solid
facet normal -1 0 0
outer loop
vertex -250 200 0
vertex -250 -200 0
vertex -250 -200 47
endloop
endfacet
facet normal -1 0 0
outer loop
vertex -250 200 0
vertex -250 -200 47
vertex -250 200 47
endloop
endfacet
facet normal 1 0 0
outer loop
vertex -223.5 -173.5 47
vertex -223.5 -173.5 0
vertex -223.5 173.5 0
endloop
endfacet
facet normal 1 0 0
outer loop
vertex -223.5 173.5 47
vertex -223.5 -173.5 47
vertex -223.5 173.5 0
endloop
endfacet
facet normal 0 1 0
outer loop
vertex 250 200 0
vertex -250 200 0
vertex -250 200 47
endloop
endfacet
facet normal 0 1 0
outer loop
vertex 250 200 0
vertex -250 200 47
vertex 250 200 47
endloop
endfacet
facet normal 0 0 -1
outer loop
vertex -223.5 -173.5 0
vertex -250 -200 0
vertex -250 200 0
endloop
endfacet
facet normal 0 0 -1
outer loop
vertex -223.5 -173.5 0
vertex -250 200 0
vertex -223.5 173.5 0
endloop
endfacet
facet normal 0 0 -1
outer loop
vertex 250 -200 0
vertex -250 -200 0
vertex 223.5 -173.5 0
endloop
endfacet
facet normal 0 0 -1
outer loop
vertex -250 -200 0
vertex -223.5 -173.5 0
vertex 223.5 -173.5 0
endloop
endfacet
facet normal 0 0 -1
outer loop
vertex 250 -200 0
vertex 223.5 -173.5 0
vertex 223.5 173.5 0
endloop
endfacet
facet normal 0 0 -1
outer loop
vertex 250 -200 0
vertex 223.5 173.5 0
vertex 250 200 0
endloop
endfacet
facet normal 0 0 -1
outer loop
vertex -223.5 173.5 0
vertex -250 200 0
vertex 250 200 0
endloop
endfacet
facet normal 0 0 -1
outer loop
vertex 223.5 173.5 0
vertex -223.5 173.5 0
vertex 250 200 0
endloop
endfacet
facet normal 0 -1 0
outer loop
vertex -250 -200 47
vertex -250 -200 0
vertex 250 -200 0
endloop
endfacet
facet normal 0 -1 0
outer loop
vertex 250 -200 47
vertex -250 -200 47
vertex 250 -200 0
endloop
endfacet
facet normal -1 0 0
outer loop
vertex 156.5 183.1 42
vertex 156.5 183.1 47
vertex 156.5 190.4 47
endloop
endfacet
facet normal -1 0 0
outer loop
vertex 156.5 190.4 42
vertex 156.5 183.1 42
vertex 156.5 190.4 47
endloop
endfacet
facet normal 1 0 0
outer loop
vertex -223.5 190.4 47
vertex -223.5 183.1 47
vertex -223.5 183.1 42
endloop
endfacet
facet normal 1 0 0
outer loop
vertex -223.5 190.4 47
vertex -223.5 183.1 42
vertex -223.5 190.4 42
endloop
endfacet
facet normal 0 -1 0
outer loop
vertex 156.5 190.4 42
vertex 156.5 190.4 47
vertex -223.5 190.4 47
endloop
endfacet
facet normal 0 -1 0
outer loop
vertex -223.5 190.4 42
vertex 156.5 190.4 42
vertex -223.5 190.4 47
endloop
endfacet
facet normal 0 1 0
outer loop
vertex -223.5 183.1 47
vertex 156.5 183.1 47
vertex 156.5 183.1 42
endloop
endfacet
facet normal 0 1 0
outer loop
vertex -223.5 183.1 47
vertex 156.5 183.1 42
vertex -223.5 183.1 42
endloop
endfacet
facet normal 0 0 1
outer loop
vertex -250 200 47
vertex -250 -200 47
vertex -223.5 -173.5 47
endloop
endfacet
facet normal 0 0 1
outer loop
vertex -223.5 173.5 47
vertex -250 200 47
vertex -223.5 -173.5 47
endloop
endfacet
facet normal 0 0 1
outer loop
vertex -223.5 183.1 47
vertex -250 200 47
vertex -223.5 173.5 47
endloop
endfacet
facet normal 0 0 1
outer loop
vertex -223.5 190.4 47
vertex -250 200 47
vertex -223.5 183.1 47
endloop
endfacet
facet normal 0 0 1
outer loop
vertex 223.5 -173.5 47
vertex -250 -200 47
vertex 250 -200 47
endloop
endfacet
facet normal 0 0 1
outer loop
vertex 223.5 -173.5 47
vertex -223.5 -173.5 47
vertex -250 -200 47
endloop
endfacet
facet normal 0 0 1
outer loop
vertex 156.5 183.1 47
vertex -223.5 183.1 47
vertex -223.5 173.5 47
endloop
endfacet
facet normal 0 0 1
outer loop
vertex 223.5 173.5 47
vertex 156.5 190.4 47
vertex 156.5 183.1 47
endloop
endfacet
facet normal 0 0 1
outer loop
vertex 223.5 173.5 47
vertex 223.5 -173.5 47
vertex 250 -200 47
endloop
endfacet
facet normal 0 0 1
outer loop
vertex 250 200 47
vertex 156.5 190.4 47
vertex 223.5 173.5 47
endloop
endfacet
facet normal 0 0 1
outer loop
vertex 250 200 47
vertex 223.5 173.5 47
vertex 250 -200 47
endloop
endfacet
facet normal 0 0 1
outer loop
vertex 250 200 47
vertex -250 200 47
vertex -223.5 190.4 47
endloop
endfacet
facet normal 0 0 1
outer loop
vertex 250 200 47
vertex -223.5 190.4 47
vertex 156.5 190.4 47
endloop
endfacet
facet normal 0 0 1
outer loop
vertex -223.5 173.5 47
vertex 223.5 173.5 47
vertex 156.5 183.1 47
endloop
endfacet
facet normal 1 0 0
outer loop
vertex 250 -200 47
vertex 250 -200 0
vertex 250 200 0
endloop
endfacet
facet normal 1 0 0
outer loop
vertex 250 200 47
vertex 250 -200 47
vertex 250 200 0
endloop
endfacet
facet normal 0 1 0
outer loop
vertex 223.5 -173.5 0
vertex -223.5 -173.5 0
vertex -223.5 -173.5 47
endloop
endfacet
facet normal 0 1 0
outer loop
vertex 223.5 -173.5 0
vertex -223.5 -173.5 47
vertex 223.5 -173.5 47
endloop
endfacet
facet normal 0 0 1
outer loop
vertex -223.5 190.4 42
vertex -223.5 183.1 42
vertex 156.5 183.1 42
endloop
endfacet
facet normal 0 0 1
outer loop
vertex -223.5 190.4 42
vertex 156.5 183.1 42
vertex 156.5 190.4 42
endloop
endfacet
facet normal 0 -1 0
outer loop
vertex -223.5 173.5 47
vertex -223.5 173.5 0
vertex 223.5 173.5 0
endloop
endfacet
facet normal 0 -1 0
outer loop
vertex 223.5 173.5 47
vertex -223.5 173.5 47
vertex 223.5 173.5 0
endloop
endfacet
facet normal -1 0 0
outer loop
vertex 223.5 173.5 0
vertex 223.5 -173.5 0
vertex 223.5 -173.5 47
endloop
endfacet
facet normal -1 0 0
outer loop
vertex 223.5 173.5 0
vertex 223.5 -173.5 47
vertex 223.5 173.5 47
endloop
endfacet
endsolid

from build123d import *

# Parameters (mm, degrees)
SKETCH007_W     = 500
SKETCH007_H     = 400
SKETCH007_W_2   = 447
SKETCH007_H_2   = 347
PAD002_DEPTH    = 47
PAD003_DEPTH    = 380
PAD003_FACE11_W = 7.3
PAD003_FACE11_H = 380
POCKET002_DEPTH = 5


with BuildPart() as part:
    # Sketch007 → Pad002 (new body)
    with BuildSketch(Plane.XY):
        Rectangle(SKETCH007_W, SKETCH007_H)
        Rectangle(SKETCH007_W_2, SKETCH007_H_2, mode=Mode.SUBTRACT)
    extrude(amount=PAD002_DEPTH)

    # Sketch008 (on Face5 of Pad002) → Pad003 (join)
    with BuildSketch(Plane.YZ.offset(-223.5)):
        Polygon((183.1, 42), (183.1, 47), (190.4, 47), (190.4, 42), (189.4, 42), (189.4, 46), (184.1, 46), (184.1, 42), align=None)
    extrude(amount=PAD003_DEPTH)

    # Pad003 Face11 → Pocket002 (cut)
    with BuildSketch(Plane(origin=(-33.5, 186.75, 47), x_dir=(0, 1, 0), z_dir=(0, 0, 1))):
        Rectangle(PAD003_FACE11_W, PAD003_FACE11_H)
    extrude(amount=-POCKET002_DEPTH, mode=Mode.SUBTRACT)


solid = part.part
